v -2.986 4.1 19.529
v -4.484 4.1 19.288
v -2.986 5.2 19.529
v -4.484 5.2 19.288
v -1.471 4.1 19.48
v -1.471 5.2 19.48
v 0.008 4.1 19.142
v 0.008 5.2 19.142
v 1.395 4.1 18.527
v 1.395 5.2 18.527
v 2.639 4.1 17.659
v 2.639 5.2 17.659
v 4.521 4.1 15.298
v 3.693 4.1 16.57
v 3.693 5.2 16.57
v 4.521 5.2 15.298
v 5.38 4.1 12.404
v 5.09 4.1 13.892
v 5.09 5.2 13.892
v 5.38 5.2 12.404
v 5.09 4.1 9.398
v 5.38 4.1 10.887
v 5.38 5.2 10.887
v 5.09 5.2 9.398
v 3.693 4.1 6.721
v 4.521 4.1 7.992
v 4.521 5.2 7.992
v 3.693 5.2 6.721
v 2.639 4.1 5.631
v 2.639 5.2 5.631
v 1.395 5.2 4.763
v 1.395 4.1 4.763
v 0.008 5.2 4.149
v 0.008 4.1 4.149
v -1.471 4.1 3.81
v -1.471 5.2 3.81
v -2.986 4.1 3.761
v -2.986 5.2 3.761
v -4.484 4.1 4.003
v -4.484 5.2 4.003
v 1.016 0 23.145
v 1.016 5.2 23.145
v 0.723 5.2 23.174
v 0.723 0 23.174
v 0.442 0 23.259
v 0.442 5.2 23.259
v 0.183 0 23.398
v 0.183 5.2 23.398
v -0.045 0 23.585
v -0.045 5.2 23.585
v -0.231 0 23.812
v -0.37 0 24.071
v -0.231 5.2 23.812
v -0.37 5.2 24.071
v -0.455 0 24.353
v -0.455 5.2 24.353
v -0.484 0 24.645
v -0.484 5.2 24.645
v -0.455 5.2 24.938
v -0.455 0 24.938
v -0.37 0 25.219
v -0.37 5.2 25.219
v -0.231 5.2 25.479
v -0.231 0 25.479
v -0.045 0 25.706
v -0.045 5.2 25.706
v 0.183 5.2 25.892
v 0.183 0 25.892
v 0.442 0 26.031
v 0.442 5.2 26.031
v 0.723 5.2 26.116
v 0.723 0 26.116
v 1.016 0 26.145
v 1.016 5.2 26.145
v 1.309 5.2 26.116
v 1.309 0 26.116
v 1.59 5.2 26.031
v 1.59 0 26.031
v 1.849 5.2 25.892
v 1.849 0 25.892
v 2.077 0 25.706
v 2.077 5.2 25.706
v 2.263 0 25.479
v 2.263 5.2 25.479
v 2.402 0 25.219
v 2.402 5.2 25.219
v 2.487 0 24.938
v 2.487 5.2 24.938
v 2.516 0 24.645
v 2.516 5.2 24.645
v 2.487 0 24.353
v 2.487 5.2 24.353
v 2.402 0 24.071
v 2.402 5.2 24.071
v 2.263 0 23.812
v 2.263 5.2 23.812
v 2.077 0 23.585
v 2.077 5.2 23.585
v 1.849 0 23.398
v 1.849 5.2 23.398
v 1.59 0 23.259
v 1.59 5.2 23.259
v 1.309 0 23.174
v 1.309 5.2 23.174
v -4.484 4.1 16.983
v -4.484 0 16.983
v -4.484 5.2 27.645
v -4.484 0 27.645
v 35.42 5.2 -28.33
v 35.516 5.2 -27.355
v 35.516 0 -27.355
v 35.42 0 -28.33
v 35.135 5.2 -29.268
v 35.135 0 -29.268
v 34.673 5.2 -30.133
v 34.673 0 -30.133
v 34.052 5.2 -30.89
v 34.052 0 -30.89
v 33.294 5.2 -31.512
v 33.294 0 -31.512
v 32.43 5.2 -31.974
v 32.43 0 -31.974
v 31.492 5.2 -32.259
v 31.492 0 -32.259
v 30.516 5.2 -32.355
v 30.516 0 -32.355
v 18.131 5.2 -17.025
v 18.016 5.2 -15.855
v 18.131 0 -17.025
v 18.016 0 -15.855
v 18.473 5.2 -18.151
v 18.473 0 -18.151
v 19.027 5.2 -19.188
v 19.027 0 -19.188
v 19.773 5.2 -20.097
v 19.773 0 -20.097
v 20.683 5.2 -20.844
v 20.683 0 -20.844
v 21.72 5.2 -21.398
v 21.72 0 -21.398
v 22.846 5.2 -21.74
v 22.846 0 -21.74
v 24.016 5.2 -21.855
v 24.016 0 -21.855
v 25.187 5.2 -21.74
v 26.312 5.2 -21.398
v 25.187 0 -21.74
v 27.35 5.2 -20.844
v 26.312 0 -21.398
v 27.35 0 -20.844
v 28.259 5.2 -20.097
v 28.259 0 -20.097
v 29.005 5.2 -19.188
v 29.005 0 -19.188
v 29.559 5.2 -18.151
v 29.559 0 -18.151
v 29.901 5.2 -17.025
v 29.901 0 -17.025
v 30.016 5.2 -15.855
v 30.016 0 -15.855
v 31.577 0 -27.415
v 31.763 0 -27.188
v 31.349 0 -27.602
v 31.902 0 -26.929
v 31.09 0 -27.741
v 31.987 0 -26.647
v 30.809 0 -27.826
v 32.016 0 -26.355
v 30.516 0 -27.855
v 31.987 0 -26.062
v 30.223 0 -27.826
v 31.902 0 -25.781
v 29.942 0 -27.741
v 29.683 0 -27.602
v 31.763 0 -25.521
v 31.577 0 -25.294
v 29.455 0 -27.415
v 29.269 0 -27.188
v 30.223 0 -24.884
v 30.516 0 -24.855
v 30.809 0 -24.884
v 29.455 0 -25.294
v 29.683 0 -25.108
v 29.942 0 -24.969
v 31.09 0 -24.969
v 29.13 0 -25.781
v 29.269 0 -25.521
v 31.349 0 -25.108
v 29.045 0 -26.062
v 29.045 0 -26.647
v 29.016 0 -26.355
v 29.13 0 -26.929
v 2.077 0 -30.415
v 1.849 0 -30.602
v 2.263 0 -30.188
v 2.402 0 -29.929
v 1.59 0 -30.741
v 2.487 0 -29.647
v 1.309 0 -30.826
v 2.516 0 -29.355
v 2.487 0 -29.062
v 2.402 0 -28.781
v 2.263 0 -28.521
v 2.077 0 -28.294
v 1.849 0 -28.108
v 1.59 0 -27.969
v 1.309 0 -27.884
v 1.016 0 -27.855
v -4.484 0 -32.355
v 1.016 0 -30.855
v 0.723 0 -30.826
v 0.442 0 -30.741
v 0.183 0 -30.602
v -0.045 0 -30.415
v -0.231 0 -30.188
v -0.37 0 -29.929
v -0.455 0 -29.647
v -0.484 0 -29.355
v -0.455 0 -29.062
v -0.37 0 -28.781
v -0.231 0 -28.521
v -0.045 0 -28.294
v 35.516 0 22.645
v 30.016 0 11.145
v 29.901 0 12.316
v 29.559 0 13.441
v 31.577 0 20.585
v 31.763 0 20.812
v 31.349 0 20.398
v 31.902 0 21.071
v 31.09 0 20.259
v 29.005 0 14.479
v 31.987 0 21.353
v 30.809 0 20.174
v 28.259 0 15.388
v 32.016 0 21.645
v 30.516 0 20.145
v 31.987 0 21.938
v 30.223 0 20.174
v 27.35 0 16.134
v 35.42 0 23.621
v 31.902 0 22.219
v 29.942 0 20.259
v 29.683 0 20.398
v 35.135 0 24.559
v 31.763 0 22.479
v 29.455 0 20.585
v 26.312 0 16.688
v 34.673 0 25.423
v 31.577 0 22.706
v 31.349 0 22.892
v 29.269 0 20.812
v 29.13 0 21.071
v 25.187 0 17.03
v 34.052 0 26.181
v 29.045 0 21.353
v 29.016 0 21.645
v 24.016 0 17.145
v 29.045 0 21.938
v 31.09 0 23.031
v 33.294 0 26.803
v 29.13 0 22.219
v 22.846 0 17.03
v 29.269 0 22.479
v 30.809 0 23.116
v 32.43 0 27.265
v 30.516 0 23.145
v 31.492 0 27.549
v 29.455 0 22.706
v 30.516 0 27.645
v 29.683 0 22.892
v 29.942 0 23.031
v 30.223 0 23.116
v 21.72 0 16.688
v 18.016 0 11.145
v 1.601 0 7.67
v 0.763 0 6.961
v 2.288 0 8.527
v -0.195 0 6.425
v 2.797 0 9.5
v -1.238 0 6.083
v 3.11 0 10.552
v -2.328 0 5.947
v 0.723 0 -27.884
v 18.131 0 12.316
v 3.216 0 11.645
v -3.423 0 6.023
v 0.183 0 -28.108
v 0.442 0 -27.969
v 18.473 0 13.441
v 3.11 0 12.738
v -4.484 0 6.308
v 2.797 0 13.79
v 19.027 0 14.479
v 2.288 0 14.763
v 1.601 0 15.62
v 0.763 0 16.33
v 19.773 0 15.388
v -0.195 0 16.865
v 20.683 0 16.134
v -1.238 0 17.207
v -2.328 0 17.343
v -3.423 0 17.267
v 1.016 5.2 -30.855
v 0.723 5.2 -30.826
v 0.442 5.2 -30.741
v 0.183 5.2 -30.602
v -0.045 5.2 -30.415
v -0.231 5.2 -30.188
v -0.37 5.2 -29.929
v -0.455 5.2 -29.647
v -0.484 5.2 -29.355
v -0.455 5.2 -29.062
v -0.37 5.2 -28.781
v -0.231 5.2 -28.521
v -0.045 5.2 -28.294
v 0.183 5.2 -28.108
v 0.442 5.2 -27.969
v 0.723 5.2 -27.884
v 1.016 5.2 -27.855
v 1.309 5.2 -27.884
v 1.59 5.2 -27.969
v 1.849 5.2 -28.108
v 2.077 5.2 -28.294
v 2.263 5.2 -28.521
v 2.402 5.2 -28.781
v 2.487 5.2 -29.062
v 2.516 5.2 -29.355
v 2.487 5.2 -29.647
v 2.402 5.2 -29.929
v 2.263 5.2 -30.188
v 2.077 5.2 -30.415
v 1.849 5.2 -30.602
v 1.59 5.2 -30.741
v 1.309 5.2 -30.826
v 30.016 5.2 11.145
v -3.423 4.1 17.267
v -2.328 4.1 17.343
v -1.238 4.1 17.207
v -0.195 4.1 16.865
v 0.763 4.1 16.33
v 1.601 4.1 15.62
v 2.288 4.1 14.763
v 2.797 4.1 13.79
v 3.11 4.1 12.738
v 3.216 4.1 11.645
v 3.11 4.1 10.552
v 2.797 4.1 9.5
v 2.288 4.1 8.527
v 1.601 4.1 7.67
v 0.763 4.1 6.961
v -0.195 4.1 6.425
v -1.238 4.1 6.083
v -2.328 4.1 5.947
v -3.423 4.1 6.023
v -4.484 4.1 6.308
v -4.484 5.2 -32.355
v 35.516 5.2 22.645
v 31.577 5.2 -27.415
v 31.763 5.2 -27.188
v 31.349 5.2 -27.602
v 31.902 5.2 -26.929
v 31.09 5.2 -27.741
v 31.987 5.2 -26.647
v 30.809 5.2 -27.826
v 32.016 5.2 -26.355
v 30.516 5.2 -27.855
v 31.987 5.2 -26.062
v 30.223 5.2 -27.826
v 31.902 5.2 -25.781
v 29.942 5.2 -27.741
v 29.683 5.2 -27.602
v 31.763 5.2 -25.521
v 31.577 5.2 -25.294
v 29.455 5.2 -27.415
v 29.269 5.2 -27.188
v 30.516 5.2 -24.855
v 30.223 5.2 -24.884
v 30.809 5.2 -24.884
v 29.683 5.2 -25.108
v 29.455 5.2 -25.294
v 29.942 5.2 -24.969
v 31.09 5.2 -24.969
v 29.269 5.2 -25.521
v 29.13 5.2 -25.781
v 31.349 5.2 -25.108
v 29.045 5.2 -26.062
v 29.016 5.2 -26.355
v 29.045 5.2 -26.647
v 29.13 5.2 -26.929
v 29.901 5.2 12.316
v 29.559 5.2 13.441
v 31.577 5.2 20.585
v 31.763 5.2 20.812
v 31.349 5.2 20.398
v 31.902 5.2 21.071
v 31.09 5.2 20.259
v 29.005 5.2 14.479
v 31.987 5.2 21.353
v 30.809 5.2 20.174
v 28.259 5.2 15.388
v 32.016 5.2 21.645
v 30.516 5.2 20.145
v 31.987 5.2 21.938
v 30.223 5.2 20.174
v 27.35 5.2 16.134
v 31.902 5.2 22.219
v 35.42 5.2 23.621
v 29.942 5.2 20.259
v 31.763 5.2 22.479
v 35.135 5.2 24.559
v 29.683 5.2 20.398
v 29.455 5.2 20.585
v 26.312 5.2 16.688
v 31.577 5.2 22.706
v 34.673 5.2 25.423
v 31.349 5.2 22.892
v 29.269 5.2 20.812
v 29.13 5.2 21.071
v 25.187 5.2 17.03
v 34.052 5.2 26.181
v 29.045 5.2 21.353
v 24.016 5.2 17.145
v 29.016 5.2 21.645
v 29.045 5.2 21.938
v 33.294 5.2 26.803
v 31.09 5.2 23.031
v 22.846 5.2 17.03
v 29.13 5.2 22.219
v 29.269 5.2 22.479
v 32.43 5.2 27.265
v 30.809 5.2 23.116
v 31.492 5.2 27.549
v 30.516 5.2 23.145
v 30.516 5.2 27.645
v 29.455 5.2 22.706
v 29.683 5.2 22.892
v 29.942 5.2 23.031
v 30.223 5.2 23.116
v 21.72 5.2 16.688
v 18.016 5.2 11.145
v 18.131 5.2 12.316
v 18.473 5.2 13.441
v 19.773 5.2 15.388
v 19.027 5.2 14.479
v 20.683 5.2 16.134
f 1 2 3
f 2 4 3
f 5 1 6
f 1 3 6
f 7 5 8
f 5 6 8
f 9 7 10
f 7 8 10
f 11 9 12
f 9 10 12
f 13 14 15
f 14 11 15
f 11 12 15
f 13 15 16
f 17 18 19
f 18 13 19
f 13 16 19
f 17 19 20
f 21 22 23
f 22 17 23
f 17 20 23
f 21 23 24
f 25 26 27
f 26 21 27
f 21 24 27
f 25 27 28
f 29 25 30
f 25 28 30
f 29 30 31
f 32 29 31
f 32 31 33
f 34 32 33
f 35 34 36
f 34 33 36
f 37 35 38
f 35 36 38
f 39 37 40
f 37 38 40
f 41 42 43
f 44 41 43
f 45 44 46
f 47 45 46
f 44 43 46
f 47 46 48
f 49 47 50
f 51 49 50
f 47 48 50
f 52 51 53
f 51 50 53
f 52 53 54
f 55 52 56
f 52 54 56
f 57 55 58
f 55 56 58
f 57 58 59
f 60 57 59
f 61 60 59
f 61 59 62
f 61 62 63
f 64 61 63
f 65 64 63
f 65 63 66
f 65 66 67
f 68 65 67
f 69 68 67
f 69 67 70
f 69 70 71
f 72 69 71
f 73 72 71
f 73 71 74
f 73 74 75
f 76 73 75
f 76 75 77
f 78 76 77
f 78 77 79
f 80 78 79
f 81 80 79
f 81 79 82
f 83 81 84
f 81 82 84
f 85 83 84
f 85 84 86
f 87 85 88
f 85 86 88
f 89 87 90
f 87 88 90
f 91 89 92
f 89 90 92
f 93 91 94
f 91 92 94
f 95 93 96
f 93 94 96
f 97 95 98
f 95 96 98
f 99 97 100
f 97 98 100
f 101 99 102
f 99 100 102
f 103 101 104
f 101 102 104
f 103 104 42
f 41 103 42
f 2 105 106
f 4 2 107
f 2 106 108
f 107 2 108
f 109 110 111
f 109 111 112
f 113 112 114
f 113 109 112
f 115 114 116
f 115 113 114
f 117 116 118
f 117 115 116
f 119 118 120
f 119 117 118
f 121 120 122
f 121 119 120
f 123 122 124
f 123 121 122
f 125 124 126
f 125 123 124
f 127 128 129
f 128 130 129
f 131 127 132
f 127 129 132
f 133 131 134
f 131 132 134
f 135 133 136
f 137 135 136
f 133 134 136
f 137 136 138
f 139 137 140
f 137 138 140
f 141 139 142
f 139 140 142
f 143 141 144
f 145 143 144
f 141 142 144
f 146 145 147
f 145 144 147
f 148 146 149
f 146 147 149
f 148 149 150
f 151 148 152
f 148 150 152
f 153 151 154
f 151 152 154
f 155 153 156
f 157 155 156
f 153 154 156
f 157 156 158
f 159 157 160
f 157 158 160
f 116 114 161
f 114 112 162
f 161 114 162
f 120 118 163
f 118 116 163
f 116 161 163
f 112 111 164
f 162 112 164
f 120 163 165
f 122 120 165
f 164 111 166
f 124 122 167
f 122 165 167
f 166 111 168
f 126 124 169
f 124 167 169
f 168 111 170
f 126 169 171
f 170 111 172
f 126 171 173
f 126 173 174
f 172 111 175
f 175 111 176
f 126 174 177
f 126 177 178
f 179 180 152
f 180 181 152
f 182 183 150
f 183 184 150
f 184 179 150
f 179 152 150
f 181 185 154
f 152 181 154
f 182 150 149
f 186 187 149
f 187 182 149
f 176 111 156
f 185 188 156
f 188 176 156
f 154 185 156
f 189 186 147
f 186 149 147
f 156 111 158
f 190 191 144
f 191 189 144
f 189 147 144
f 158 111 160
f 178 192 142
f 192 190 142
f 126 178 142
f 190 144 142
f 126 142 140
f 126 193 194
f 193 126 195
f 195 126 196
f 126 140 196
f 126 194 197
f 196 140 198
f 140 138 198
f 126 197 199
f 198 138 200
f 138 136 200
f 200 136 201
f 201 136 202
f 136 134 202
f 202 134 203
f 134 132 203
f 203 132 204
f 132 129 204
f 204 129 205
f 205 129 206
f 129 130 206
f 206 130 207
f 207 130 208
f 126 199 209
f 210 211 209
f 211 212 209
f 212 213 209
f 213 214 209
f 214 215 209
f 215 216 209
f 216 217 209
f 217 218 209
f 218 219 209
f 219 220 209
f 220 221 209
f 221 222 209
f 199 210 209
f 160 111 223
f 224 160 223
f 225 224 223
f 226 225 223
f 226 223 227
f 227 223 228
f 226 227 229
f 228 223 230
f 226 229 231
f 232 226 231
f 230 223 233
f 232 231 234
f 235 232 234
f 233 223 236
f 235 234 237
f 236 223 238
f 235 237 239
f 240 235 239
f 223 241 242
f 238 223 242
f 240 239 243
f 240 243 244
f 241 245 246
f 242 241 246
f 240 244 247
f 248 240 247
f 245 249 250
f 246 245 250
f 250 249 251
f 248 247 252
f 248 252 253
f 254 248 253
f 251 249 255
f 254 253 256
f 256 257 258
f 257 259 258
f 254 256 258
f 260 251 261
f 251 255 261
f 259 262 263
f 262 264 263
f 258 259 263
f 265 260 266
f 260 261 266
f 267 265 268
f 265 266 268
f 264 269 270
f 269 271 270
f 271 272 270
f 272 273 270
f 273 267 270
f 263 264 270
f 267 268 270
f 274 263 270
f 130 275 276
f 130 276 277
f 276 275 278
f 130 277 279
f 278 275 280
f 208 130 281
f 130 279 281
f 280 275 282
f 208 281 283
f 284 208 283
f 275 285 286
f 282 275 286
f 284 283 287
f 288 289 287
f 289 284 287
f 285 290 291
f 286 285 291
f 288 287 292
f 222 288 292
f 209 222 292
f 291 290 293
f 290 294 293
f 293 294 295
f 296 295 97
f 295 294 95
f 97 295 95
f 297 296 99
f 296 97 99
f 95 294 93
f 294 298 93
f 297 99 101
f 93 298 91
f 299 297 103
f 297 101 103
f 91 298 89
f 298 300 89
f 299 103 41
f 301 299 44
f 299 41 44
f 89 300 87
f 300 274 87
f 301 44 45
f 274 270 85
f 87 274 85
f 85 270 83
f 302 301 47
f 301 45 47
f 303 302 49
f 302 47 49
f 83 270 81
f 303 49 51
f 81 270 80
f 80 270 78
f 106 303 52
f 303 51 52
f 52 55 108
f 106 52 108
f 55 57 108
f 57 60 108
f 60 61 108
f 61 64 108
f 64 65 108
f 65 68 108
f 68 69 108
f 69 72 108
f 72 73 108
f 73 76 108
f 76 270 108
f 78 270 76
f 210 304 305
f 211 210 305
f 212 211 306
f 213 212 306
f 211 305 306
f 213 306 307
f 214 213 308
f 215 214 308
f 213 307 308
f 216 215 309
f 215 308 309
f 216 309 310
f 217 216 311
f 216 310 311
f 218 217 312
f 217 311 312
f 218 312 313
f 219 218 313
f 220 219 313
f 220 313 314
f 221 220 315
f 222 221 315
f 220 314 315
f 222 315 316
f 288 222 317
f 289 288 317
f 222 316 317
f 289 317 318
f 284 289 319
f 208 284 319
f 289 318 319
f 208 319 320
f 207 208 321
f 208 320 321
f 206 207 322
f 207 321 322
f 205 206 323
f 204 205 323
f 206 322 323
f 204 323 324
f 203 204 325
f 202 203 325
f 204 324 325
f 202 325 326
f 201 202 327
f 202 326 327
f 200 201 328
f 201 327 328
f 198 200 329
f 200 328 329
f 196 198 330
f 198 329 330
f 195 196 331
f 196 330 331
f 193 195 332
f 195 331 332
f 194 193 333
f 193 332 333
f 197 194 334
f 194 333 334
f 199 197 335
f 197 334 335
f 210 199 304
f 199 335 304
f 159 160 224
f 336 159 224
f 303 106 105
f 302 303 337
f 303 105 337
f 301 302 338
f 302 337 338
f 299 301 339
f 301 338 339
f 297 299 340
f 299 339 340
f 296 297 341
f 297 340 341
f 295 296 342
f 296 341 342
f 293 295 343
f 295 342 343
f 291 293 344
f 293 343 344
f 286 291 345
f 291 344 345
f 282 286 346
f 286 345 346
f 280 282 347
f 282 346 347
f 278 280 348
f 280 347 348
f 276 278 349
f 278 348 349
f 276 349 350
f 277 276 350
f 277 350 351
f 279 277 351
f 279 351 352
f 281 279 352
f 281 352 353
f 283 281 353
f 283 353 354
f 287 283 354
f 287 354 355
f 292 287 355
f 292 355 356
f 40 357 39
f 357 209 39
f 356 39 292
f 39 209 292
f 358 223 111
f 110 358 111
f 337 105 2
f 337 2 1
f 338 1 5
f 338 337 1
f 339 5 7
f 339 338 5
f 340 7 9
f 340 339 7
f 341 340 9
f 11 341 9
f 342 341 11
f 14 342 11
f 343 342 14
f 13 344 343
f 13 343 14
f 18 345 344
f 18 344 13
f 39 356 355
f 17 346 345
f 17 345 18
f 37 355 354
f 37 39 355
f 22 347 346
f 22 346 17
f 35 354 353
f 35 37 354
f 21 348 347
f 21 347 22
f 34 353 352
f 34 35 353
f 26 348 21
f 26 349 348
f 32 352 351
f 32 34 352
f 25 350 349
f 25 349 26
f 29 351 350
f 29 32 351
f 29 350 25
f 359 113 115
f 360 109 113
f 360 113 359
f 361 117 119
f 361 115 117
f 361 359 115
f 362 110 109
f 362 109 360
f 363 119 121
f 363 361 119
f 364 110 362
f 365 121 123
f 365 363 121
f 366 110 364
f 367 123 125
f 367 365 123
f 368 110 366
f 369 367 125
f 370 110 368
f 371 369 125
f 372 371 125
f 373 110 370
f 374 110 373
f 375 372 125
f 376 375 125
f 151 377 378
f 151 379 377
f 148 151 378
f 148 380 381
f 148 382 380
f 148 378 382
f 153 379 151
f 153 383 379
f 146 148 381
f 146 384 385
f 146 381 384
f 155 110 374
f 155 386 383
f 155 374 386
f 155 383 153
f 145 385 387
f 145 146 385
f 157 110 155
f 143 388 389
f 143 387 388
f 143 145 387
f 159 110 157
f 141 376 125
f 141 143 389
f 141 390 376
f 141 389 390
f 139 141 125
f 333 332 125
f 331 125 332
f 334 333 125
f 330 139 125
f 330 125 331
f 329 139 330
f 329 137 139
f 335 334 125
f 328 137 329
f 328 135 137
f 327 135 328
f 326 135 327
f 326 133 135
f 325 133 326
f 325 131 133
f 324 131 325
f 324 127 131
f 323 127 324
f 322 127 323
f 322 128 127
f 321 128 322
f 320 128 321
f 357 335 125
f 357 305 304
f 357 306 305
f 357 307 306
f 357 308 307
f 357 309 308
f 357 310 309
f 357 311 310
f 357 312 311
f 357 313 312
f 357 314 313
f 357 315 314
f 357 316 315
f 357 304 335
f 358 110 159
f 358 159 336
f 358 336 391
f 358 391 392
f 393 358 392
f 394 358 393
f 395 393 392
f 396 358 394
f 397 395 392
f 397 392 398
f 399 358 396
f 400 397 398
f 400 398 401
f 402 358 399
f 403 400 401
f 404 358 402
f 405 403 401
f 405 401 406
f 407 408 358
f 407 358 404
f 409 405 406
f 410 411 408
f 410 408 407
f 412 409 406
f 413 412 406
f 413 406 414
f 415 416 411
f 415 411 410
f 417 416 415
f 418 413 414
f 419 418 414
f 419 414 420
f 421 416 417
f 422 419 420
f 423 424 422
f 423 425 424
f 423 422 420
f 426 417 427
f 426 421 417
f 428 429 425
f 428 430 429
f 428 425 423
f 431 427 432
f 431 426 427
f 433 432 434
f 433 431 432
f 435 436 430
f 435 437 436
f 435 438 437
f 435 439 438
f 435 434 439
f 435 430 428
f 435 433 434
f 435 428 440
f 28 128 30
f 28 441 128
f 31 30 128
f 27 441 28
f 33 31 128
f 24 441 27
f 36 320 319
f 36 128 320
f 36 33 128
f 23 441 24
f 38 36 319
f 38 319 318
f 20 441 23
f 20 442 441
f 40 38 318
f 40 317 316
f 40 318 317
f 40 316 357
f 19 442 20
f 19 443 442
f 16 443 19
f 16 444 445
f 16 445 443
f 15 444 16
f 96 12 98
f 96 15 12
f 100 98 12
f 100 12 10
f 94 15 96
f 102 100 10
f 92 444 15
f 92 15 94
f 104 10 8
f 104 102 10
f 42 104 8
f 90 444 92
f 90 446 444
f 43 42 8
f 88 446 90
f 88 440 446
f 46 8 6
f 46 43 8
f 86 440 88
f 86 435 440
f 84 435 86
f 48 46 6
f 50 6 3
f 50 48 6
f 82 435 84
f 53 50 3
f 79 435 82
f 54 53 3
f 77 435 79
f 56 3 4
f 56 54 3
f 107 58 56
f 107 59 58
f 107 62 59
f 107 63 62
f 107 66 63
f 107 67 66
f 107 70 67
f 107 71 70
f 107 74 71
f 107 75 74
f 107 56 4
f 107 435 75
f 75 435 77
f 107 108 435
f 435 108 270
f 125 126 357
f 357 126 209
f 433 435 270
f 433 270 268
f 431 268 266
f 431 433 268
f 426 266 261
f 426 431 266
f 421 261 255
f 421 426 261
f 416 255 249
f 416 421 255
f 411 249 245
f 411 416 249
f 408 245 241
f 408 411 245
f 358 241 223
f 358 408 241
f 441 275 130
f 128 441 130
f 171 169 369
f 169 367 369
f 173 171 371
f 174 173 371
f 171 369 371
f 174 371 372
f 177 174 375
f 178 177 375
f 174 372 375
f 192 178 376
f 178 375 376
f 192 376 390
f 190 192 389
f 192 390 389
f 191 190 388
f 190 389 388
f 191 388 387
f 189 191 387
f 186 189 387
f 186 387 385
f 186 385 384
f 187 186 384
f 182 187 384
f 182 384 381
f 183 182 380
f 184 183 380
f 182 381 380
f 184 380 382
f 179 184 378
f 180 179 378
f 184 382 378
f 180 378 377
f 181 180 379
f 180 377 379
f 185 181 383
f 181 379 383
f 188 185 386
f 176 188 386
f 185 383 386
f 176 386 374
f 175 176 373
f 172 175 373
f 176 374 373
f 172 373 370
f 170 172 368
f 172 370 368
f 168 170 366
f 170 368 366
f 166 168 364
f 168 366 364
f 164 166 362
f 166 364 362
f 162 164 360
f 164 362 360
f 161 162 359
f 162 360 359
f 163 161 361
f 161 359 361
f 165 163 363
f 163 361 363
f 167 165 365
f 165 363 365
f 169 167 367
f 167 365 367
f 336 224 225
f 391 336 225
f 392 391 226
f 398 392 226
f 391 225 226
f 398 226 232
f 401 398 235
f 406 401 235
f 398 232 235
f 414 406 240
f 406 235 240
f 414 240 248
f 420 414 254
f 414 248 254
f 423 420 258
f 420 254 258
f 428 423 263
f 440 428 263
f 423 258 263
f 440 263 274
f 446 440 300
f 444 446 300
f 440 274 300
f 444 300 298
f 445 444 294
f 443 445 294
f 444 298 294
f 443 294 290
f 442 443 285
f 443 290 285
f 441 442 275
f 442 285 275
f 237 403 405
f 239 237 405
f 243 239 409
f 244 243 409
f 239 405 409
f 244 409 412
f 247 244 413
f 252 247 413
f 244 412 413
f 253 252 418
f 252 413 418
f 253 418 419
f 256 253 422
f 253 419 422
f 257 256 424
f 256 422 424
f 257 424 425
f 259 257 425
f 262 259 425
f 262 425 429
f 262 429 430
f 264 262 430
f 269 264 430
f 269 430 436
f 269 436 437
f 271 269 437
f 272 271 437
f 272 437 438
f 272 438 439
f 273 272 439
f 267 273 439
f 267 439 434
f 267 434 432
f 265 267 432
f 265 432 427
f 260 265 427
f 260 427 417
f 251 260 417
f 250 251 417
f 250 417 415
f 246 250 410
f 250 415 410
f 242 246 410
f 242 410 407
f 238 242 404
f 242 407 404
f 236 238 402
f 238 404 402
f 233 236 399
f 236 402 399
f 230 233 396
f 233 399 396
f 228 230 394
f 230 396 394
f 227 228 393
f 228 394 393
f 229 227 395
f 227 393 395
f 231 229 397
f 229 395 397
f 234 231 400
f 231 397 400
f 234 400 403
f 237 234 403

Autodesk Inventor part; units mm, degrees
ref_plane "YZ Plane" through (0, 0, 0) normal (1, 0, 0) x (0, 1, 0)
ref_plane "XZ Plane" through (0, 0, 0) normal (0, 1, 0) x (-1, 0, 0)
sketch "Sketch1" plane through (0, 0, 0) normal (0, 1, 0) x (-1, 0, 0)
  line L0 (4.4839, 27.6452) -> (-35.5161, 27.6452)
  line L1 (-35.5161, 27.6452) -> (-35.5161, -32.3548)
  line L2 (-35.5161, -32.3548) -> (4.4839, -32.3548)
  line L3 (4.4839, -32.3548) -> (4.4839, 27.6452)
  point P0 (0, 0)
  dimension "d0" = 60
  dimension "d1" = 40
extrude "Extrusion1" add sketch "Sketch1" along normal blind 5.2
fillet "Fillet1" radius 5 2 edges at (35.5161, 2.6, -32.3548) (35.5161, 2.6, 27.6452)
sketch "Sketch2" plane through (0, 0, 0) normal (0, -1, 0) x (1, 0, 0)
  circle A0 centre (30.5161, 21.6452) radius 1.5 projected
  circle A1 centre (1.0161, 24.6452) radius 1.5 projected
  circle A2 centre (1.0161, -29.3548) radius 1.5 projected
  circle A3 centre (30.5161, -26.3548) radius 1.5 projected
  point P0 (0, 0)
hole "Hole1" at (30.5161, 0, 21.6452) at (30.5161, 0, -26.3548) at (1.0161, 0, -29.3548) at (1.0161, 0, 24.6452) direction (0, 1, 0) diameter 3 end through all
sketch "Sketch3" plane through (0, 5.2, 0) normal (0, 1, 0) x (1, 0, 0)
  circle A0 centre (-2.4839, -11.6452) radius 7.9 projected
  point P0 (0, 0)
ref_plane "Work Plane1" through (-10.3839, 4.1, 4.0025) normal (0, 1, 0) x (0, 0, 1)
extrude "Extrusion2" cut sketch "Sketch3" against normal up to surface (1.1 mm away)
sketch "Sketch4" plane through (-2.4839, 4.1, 11.6452) normal (0, 1, 0) x (1, 0, 0)
  arc A0 (-2, 5.3376) -> (-2, -5.3376) centre (0, 0) ccw projected
  circle A1 centre (0, 0) radius 5.5 projected
  circle A2 centre (0, 0) radius 5.7
  point P0 (2.4839, 11.6452)
  dimension "d14" = 11.4
extrude "Extrusion3" cut sketch "Sketch4" against normal through all contours A2 A0 | A1
sketch "Sketch5" plane through (0, 0, 0) normal (0, -1, 0) x (1, 0, 0)
  circle A0 centre (24.0161, 11.1452) radius 6 projected
  circle A1 centre (24.0161, -15.8548) radius 6 projected
  line L0 (24.0161, 11.1452) -> (24.0161, -15.8548) construction
  line L1 (18.0161, 11.1452) -> (18.0161, -15.8548)
  line L2 (30.0161, -15.8548) -> (30.0161, 11.1452)
  arc A2 (30.0161, 11.1452) -> (18.0161, 11.1452) centre (24.0161, 11.1452) ccw
  arc A3 (18.0161, -15.8548) -> (30.0161, -15.8548) centre (24.0161, -15.8548) ccw
  point P0 (0, 0)
  point P1 (24.0161, -2.3548)
extrude "Extrusion4" cut sketch "Sketch5" against normal through all
properties part number "Carro XY_trava_B" material "ABS Plastic"
